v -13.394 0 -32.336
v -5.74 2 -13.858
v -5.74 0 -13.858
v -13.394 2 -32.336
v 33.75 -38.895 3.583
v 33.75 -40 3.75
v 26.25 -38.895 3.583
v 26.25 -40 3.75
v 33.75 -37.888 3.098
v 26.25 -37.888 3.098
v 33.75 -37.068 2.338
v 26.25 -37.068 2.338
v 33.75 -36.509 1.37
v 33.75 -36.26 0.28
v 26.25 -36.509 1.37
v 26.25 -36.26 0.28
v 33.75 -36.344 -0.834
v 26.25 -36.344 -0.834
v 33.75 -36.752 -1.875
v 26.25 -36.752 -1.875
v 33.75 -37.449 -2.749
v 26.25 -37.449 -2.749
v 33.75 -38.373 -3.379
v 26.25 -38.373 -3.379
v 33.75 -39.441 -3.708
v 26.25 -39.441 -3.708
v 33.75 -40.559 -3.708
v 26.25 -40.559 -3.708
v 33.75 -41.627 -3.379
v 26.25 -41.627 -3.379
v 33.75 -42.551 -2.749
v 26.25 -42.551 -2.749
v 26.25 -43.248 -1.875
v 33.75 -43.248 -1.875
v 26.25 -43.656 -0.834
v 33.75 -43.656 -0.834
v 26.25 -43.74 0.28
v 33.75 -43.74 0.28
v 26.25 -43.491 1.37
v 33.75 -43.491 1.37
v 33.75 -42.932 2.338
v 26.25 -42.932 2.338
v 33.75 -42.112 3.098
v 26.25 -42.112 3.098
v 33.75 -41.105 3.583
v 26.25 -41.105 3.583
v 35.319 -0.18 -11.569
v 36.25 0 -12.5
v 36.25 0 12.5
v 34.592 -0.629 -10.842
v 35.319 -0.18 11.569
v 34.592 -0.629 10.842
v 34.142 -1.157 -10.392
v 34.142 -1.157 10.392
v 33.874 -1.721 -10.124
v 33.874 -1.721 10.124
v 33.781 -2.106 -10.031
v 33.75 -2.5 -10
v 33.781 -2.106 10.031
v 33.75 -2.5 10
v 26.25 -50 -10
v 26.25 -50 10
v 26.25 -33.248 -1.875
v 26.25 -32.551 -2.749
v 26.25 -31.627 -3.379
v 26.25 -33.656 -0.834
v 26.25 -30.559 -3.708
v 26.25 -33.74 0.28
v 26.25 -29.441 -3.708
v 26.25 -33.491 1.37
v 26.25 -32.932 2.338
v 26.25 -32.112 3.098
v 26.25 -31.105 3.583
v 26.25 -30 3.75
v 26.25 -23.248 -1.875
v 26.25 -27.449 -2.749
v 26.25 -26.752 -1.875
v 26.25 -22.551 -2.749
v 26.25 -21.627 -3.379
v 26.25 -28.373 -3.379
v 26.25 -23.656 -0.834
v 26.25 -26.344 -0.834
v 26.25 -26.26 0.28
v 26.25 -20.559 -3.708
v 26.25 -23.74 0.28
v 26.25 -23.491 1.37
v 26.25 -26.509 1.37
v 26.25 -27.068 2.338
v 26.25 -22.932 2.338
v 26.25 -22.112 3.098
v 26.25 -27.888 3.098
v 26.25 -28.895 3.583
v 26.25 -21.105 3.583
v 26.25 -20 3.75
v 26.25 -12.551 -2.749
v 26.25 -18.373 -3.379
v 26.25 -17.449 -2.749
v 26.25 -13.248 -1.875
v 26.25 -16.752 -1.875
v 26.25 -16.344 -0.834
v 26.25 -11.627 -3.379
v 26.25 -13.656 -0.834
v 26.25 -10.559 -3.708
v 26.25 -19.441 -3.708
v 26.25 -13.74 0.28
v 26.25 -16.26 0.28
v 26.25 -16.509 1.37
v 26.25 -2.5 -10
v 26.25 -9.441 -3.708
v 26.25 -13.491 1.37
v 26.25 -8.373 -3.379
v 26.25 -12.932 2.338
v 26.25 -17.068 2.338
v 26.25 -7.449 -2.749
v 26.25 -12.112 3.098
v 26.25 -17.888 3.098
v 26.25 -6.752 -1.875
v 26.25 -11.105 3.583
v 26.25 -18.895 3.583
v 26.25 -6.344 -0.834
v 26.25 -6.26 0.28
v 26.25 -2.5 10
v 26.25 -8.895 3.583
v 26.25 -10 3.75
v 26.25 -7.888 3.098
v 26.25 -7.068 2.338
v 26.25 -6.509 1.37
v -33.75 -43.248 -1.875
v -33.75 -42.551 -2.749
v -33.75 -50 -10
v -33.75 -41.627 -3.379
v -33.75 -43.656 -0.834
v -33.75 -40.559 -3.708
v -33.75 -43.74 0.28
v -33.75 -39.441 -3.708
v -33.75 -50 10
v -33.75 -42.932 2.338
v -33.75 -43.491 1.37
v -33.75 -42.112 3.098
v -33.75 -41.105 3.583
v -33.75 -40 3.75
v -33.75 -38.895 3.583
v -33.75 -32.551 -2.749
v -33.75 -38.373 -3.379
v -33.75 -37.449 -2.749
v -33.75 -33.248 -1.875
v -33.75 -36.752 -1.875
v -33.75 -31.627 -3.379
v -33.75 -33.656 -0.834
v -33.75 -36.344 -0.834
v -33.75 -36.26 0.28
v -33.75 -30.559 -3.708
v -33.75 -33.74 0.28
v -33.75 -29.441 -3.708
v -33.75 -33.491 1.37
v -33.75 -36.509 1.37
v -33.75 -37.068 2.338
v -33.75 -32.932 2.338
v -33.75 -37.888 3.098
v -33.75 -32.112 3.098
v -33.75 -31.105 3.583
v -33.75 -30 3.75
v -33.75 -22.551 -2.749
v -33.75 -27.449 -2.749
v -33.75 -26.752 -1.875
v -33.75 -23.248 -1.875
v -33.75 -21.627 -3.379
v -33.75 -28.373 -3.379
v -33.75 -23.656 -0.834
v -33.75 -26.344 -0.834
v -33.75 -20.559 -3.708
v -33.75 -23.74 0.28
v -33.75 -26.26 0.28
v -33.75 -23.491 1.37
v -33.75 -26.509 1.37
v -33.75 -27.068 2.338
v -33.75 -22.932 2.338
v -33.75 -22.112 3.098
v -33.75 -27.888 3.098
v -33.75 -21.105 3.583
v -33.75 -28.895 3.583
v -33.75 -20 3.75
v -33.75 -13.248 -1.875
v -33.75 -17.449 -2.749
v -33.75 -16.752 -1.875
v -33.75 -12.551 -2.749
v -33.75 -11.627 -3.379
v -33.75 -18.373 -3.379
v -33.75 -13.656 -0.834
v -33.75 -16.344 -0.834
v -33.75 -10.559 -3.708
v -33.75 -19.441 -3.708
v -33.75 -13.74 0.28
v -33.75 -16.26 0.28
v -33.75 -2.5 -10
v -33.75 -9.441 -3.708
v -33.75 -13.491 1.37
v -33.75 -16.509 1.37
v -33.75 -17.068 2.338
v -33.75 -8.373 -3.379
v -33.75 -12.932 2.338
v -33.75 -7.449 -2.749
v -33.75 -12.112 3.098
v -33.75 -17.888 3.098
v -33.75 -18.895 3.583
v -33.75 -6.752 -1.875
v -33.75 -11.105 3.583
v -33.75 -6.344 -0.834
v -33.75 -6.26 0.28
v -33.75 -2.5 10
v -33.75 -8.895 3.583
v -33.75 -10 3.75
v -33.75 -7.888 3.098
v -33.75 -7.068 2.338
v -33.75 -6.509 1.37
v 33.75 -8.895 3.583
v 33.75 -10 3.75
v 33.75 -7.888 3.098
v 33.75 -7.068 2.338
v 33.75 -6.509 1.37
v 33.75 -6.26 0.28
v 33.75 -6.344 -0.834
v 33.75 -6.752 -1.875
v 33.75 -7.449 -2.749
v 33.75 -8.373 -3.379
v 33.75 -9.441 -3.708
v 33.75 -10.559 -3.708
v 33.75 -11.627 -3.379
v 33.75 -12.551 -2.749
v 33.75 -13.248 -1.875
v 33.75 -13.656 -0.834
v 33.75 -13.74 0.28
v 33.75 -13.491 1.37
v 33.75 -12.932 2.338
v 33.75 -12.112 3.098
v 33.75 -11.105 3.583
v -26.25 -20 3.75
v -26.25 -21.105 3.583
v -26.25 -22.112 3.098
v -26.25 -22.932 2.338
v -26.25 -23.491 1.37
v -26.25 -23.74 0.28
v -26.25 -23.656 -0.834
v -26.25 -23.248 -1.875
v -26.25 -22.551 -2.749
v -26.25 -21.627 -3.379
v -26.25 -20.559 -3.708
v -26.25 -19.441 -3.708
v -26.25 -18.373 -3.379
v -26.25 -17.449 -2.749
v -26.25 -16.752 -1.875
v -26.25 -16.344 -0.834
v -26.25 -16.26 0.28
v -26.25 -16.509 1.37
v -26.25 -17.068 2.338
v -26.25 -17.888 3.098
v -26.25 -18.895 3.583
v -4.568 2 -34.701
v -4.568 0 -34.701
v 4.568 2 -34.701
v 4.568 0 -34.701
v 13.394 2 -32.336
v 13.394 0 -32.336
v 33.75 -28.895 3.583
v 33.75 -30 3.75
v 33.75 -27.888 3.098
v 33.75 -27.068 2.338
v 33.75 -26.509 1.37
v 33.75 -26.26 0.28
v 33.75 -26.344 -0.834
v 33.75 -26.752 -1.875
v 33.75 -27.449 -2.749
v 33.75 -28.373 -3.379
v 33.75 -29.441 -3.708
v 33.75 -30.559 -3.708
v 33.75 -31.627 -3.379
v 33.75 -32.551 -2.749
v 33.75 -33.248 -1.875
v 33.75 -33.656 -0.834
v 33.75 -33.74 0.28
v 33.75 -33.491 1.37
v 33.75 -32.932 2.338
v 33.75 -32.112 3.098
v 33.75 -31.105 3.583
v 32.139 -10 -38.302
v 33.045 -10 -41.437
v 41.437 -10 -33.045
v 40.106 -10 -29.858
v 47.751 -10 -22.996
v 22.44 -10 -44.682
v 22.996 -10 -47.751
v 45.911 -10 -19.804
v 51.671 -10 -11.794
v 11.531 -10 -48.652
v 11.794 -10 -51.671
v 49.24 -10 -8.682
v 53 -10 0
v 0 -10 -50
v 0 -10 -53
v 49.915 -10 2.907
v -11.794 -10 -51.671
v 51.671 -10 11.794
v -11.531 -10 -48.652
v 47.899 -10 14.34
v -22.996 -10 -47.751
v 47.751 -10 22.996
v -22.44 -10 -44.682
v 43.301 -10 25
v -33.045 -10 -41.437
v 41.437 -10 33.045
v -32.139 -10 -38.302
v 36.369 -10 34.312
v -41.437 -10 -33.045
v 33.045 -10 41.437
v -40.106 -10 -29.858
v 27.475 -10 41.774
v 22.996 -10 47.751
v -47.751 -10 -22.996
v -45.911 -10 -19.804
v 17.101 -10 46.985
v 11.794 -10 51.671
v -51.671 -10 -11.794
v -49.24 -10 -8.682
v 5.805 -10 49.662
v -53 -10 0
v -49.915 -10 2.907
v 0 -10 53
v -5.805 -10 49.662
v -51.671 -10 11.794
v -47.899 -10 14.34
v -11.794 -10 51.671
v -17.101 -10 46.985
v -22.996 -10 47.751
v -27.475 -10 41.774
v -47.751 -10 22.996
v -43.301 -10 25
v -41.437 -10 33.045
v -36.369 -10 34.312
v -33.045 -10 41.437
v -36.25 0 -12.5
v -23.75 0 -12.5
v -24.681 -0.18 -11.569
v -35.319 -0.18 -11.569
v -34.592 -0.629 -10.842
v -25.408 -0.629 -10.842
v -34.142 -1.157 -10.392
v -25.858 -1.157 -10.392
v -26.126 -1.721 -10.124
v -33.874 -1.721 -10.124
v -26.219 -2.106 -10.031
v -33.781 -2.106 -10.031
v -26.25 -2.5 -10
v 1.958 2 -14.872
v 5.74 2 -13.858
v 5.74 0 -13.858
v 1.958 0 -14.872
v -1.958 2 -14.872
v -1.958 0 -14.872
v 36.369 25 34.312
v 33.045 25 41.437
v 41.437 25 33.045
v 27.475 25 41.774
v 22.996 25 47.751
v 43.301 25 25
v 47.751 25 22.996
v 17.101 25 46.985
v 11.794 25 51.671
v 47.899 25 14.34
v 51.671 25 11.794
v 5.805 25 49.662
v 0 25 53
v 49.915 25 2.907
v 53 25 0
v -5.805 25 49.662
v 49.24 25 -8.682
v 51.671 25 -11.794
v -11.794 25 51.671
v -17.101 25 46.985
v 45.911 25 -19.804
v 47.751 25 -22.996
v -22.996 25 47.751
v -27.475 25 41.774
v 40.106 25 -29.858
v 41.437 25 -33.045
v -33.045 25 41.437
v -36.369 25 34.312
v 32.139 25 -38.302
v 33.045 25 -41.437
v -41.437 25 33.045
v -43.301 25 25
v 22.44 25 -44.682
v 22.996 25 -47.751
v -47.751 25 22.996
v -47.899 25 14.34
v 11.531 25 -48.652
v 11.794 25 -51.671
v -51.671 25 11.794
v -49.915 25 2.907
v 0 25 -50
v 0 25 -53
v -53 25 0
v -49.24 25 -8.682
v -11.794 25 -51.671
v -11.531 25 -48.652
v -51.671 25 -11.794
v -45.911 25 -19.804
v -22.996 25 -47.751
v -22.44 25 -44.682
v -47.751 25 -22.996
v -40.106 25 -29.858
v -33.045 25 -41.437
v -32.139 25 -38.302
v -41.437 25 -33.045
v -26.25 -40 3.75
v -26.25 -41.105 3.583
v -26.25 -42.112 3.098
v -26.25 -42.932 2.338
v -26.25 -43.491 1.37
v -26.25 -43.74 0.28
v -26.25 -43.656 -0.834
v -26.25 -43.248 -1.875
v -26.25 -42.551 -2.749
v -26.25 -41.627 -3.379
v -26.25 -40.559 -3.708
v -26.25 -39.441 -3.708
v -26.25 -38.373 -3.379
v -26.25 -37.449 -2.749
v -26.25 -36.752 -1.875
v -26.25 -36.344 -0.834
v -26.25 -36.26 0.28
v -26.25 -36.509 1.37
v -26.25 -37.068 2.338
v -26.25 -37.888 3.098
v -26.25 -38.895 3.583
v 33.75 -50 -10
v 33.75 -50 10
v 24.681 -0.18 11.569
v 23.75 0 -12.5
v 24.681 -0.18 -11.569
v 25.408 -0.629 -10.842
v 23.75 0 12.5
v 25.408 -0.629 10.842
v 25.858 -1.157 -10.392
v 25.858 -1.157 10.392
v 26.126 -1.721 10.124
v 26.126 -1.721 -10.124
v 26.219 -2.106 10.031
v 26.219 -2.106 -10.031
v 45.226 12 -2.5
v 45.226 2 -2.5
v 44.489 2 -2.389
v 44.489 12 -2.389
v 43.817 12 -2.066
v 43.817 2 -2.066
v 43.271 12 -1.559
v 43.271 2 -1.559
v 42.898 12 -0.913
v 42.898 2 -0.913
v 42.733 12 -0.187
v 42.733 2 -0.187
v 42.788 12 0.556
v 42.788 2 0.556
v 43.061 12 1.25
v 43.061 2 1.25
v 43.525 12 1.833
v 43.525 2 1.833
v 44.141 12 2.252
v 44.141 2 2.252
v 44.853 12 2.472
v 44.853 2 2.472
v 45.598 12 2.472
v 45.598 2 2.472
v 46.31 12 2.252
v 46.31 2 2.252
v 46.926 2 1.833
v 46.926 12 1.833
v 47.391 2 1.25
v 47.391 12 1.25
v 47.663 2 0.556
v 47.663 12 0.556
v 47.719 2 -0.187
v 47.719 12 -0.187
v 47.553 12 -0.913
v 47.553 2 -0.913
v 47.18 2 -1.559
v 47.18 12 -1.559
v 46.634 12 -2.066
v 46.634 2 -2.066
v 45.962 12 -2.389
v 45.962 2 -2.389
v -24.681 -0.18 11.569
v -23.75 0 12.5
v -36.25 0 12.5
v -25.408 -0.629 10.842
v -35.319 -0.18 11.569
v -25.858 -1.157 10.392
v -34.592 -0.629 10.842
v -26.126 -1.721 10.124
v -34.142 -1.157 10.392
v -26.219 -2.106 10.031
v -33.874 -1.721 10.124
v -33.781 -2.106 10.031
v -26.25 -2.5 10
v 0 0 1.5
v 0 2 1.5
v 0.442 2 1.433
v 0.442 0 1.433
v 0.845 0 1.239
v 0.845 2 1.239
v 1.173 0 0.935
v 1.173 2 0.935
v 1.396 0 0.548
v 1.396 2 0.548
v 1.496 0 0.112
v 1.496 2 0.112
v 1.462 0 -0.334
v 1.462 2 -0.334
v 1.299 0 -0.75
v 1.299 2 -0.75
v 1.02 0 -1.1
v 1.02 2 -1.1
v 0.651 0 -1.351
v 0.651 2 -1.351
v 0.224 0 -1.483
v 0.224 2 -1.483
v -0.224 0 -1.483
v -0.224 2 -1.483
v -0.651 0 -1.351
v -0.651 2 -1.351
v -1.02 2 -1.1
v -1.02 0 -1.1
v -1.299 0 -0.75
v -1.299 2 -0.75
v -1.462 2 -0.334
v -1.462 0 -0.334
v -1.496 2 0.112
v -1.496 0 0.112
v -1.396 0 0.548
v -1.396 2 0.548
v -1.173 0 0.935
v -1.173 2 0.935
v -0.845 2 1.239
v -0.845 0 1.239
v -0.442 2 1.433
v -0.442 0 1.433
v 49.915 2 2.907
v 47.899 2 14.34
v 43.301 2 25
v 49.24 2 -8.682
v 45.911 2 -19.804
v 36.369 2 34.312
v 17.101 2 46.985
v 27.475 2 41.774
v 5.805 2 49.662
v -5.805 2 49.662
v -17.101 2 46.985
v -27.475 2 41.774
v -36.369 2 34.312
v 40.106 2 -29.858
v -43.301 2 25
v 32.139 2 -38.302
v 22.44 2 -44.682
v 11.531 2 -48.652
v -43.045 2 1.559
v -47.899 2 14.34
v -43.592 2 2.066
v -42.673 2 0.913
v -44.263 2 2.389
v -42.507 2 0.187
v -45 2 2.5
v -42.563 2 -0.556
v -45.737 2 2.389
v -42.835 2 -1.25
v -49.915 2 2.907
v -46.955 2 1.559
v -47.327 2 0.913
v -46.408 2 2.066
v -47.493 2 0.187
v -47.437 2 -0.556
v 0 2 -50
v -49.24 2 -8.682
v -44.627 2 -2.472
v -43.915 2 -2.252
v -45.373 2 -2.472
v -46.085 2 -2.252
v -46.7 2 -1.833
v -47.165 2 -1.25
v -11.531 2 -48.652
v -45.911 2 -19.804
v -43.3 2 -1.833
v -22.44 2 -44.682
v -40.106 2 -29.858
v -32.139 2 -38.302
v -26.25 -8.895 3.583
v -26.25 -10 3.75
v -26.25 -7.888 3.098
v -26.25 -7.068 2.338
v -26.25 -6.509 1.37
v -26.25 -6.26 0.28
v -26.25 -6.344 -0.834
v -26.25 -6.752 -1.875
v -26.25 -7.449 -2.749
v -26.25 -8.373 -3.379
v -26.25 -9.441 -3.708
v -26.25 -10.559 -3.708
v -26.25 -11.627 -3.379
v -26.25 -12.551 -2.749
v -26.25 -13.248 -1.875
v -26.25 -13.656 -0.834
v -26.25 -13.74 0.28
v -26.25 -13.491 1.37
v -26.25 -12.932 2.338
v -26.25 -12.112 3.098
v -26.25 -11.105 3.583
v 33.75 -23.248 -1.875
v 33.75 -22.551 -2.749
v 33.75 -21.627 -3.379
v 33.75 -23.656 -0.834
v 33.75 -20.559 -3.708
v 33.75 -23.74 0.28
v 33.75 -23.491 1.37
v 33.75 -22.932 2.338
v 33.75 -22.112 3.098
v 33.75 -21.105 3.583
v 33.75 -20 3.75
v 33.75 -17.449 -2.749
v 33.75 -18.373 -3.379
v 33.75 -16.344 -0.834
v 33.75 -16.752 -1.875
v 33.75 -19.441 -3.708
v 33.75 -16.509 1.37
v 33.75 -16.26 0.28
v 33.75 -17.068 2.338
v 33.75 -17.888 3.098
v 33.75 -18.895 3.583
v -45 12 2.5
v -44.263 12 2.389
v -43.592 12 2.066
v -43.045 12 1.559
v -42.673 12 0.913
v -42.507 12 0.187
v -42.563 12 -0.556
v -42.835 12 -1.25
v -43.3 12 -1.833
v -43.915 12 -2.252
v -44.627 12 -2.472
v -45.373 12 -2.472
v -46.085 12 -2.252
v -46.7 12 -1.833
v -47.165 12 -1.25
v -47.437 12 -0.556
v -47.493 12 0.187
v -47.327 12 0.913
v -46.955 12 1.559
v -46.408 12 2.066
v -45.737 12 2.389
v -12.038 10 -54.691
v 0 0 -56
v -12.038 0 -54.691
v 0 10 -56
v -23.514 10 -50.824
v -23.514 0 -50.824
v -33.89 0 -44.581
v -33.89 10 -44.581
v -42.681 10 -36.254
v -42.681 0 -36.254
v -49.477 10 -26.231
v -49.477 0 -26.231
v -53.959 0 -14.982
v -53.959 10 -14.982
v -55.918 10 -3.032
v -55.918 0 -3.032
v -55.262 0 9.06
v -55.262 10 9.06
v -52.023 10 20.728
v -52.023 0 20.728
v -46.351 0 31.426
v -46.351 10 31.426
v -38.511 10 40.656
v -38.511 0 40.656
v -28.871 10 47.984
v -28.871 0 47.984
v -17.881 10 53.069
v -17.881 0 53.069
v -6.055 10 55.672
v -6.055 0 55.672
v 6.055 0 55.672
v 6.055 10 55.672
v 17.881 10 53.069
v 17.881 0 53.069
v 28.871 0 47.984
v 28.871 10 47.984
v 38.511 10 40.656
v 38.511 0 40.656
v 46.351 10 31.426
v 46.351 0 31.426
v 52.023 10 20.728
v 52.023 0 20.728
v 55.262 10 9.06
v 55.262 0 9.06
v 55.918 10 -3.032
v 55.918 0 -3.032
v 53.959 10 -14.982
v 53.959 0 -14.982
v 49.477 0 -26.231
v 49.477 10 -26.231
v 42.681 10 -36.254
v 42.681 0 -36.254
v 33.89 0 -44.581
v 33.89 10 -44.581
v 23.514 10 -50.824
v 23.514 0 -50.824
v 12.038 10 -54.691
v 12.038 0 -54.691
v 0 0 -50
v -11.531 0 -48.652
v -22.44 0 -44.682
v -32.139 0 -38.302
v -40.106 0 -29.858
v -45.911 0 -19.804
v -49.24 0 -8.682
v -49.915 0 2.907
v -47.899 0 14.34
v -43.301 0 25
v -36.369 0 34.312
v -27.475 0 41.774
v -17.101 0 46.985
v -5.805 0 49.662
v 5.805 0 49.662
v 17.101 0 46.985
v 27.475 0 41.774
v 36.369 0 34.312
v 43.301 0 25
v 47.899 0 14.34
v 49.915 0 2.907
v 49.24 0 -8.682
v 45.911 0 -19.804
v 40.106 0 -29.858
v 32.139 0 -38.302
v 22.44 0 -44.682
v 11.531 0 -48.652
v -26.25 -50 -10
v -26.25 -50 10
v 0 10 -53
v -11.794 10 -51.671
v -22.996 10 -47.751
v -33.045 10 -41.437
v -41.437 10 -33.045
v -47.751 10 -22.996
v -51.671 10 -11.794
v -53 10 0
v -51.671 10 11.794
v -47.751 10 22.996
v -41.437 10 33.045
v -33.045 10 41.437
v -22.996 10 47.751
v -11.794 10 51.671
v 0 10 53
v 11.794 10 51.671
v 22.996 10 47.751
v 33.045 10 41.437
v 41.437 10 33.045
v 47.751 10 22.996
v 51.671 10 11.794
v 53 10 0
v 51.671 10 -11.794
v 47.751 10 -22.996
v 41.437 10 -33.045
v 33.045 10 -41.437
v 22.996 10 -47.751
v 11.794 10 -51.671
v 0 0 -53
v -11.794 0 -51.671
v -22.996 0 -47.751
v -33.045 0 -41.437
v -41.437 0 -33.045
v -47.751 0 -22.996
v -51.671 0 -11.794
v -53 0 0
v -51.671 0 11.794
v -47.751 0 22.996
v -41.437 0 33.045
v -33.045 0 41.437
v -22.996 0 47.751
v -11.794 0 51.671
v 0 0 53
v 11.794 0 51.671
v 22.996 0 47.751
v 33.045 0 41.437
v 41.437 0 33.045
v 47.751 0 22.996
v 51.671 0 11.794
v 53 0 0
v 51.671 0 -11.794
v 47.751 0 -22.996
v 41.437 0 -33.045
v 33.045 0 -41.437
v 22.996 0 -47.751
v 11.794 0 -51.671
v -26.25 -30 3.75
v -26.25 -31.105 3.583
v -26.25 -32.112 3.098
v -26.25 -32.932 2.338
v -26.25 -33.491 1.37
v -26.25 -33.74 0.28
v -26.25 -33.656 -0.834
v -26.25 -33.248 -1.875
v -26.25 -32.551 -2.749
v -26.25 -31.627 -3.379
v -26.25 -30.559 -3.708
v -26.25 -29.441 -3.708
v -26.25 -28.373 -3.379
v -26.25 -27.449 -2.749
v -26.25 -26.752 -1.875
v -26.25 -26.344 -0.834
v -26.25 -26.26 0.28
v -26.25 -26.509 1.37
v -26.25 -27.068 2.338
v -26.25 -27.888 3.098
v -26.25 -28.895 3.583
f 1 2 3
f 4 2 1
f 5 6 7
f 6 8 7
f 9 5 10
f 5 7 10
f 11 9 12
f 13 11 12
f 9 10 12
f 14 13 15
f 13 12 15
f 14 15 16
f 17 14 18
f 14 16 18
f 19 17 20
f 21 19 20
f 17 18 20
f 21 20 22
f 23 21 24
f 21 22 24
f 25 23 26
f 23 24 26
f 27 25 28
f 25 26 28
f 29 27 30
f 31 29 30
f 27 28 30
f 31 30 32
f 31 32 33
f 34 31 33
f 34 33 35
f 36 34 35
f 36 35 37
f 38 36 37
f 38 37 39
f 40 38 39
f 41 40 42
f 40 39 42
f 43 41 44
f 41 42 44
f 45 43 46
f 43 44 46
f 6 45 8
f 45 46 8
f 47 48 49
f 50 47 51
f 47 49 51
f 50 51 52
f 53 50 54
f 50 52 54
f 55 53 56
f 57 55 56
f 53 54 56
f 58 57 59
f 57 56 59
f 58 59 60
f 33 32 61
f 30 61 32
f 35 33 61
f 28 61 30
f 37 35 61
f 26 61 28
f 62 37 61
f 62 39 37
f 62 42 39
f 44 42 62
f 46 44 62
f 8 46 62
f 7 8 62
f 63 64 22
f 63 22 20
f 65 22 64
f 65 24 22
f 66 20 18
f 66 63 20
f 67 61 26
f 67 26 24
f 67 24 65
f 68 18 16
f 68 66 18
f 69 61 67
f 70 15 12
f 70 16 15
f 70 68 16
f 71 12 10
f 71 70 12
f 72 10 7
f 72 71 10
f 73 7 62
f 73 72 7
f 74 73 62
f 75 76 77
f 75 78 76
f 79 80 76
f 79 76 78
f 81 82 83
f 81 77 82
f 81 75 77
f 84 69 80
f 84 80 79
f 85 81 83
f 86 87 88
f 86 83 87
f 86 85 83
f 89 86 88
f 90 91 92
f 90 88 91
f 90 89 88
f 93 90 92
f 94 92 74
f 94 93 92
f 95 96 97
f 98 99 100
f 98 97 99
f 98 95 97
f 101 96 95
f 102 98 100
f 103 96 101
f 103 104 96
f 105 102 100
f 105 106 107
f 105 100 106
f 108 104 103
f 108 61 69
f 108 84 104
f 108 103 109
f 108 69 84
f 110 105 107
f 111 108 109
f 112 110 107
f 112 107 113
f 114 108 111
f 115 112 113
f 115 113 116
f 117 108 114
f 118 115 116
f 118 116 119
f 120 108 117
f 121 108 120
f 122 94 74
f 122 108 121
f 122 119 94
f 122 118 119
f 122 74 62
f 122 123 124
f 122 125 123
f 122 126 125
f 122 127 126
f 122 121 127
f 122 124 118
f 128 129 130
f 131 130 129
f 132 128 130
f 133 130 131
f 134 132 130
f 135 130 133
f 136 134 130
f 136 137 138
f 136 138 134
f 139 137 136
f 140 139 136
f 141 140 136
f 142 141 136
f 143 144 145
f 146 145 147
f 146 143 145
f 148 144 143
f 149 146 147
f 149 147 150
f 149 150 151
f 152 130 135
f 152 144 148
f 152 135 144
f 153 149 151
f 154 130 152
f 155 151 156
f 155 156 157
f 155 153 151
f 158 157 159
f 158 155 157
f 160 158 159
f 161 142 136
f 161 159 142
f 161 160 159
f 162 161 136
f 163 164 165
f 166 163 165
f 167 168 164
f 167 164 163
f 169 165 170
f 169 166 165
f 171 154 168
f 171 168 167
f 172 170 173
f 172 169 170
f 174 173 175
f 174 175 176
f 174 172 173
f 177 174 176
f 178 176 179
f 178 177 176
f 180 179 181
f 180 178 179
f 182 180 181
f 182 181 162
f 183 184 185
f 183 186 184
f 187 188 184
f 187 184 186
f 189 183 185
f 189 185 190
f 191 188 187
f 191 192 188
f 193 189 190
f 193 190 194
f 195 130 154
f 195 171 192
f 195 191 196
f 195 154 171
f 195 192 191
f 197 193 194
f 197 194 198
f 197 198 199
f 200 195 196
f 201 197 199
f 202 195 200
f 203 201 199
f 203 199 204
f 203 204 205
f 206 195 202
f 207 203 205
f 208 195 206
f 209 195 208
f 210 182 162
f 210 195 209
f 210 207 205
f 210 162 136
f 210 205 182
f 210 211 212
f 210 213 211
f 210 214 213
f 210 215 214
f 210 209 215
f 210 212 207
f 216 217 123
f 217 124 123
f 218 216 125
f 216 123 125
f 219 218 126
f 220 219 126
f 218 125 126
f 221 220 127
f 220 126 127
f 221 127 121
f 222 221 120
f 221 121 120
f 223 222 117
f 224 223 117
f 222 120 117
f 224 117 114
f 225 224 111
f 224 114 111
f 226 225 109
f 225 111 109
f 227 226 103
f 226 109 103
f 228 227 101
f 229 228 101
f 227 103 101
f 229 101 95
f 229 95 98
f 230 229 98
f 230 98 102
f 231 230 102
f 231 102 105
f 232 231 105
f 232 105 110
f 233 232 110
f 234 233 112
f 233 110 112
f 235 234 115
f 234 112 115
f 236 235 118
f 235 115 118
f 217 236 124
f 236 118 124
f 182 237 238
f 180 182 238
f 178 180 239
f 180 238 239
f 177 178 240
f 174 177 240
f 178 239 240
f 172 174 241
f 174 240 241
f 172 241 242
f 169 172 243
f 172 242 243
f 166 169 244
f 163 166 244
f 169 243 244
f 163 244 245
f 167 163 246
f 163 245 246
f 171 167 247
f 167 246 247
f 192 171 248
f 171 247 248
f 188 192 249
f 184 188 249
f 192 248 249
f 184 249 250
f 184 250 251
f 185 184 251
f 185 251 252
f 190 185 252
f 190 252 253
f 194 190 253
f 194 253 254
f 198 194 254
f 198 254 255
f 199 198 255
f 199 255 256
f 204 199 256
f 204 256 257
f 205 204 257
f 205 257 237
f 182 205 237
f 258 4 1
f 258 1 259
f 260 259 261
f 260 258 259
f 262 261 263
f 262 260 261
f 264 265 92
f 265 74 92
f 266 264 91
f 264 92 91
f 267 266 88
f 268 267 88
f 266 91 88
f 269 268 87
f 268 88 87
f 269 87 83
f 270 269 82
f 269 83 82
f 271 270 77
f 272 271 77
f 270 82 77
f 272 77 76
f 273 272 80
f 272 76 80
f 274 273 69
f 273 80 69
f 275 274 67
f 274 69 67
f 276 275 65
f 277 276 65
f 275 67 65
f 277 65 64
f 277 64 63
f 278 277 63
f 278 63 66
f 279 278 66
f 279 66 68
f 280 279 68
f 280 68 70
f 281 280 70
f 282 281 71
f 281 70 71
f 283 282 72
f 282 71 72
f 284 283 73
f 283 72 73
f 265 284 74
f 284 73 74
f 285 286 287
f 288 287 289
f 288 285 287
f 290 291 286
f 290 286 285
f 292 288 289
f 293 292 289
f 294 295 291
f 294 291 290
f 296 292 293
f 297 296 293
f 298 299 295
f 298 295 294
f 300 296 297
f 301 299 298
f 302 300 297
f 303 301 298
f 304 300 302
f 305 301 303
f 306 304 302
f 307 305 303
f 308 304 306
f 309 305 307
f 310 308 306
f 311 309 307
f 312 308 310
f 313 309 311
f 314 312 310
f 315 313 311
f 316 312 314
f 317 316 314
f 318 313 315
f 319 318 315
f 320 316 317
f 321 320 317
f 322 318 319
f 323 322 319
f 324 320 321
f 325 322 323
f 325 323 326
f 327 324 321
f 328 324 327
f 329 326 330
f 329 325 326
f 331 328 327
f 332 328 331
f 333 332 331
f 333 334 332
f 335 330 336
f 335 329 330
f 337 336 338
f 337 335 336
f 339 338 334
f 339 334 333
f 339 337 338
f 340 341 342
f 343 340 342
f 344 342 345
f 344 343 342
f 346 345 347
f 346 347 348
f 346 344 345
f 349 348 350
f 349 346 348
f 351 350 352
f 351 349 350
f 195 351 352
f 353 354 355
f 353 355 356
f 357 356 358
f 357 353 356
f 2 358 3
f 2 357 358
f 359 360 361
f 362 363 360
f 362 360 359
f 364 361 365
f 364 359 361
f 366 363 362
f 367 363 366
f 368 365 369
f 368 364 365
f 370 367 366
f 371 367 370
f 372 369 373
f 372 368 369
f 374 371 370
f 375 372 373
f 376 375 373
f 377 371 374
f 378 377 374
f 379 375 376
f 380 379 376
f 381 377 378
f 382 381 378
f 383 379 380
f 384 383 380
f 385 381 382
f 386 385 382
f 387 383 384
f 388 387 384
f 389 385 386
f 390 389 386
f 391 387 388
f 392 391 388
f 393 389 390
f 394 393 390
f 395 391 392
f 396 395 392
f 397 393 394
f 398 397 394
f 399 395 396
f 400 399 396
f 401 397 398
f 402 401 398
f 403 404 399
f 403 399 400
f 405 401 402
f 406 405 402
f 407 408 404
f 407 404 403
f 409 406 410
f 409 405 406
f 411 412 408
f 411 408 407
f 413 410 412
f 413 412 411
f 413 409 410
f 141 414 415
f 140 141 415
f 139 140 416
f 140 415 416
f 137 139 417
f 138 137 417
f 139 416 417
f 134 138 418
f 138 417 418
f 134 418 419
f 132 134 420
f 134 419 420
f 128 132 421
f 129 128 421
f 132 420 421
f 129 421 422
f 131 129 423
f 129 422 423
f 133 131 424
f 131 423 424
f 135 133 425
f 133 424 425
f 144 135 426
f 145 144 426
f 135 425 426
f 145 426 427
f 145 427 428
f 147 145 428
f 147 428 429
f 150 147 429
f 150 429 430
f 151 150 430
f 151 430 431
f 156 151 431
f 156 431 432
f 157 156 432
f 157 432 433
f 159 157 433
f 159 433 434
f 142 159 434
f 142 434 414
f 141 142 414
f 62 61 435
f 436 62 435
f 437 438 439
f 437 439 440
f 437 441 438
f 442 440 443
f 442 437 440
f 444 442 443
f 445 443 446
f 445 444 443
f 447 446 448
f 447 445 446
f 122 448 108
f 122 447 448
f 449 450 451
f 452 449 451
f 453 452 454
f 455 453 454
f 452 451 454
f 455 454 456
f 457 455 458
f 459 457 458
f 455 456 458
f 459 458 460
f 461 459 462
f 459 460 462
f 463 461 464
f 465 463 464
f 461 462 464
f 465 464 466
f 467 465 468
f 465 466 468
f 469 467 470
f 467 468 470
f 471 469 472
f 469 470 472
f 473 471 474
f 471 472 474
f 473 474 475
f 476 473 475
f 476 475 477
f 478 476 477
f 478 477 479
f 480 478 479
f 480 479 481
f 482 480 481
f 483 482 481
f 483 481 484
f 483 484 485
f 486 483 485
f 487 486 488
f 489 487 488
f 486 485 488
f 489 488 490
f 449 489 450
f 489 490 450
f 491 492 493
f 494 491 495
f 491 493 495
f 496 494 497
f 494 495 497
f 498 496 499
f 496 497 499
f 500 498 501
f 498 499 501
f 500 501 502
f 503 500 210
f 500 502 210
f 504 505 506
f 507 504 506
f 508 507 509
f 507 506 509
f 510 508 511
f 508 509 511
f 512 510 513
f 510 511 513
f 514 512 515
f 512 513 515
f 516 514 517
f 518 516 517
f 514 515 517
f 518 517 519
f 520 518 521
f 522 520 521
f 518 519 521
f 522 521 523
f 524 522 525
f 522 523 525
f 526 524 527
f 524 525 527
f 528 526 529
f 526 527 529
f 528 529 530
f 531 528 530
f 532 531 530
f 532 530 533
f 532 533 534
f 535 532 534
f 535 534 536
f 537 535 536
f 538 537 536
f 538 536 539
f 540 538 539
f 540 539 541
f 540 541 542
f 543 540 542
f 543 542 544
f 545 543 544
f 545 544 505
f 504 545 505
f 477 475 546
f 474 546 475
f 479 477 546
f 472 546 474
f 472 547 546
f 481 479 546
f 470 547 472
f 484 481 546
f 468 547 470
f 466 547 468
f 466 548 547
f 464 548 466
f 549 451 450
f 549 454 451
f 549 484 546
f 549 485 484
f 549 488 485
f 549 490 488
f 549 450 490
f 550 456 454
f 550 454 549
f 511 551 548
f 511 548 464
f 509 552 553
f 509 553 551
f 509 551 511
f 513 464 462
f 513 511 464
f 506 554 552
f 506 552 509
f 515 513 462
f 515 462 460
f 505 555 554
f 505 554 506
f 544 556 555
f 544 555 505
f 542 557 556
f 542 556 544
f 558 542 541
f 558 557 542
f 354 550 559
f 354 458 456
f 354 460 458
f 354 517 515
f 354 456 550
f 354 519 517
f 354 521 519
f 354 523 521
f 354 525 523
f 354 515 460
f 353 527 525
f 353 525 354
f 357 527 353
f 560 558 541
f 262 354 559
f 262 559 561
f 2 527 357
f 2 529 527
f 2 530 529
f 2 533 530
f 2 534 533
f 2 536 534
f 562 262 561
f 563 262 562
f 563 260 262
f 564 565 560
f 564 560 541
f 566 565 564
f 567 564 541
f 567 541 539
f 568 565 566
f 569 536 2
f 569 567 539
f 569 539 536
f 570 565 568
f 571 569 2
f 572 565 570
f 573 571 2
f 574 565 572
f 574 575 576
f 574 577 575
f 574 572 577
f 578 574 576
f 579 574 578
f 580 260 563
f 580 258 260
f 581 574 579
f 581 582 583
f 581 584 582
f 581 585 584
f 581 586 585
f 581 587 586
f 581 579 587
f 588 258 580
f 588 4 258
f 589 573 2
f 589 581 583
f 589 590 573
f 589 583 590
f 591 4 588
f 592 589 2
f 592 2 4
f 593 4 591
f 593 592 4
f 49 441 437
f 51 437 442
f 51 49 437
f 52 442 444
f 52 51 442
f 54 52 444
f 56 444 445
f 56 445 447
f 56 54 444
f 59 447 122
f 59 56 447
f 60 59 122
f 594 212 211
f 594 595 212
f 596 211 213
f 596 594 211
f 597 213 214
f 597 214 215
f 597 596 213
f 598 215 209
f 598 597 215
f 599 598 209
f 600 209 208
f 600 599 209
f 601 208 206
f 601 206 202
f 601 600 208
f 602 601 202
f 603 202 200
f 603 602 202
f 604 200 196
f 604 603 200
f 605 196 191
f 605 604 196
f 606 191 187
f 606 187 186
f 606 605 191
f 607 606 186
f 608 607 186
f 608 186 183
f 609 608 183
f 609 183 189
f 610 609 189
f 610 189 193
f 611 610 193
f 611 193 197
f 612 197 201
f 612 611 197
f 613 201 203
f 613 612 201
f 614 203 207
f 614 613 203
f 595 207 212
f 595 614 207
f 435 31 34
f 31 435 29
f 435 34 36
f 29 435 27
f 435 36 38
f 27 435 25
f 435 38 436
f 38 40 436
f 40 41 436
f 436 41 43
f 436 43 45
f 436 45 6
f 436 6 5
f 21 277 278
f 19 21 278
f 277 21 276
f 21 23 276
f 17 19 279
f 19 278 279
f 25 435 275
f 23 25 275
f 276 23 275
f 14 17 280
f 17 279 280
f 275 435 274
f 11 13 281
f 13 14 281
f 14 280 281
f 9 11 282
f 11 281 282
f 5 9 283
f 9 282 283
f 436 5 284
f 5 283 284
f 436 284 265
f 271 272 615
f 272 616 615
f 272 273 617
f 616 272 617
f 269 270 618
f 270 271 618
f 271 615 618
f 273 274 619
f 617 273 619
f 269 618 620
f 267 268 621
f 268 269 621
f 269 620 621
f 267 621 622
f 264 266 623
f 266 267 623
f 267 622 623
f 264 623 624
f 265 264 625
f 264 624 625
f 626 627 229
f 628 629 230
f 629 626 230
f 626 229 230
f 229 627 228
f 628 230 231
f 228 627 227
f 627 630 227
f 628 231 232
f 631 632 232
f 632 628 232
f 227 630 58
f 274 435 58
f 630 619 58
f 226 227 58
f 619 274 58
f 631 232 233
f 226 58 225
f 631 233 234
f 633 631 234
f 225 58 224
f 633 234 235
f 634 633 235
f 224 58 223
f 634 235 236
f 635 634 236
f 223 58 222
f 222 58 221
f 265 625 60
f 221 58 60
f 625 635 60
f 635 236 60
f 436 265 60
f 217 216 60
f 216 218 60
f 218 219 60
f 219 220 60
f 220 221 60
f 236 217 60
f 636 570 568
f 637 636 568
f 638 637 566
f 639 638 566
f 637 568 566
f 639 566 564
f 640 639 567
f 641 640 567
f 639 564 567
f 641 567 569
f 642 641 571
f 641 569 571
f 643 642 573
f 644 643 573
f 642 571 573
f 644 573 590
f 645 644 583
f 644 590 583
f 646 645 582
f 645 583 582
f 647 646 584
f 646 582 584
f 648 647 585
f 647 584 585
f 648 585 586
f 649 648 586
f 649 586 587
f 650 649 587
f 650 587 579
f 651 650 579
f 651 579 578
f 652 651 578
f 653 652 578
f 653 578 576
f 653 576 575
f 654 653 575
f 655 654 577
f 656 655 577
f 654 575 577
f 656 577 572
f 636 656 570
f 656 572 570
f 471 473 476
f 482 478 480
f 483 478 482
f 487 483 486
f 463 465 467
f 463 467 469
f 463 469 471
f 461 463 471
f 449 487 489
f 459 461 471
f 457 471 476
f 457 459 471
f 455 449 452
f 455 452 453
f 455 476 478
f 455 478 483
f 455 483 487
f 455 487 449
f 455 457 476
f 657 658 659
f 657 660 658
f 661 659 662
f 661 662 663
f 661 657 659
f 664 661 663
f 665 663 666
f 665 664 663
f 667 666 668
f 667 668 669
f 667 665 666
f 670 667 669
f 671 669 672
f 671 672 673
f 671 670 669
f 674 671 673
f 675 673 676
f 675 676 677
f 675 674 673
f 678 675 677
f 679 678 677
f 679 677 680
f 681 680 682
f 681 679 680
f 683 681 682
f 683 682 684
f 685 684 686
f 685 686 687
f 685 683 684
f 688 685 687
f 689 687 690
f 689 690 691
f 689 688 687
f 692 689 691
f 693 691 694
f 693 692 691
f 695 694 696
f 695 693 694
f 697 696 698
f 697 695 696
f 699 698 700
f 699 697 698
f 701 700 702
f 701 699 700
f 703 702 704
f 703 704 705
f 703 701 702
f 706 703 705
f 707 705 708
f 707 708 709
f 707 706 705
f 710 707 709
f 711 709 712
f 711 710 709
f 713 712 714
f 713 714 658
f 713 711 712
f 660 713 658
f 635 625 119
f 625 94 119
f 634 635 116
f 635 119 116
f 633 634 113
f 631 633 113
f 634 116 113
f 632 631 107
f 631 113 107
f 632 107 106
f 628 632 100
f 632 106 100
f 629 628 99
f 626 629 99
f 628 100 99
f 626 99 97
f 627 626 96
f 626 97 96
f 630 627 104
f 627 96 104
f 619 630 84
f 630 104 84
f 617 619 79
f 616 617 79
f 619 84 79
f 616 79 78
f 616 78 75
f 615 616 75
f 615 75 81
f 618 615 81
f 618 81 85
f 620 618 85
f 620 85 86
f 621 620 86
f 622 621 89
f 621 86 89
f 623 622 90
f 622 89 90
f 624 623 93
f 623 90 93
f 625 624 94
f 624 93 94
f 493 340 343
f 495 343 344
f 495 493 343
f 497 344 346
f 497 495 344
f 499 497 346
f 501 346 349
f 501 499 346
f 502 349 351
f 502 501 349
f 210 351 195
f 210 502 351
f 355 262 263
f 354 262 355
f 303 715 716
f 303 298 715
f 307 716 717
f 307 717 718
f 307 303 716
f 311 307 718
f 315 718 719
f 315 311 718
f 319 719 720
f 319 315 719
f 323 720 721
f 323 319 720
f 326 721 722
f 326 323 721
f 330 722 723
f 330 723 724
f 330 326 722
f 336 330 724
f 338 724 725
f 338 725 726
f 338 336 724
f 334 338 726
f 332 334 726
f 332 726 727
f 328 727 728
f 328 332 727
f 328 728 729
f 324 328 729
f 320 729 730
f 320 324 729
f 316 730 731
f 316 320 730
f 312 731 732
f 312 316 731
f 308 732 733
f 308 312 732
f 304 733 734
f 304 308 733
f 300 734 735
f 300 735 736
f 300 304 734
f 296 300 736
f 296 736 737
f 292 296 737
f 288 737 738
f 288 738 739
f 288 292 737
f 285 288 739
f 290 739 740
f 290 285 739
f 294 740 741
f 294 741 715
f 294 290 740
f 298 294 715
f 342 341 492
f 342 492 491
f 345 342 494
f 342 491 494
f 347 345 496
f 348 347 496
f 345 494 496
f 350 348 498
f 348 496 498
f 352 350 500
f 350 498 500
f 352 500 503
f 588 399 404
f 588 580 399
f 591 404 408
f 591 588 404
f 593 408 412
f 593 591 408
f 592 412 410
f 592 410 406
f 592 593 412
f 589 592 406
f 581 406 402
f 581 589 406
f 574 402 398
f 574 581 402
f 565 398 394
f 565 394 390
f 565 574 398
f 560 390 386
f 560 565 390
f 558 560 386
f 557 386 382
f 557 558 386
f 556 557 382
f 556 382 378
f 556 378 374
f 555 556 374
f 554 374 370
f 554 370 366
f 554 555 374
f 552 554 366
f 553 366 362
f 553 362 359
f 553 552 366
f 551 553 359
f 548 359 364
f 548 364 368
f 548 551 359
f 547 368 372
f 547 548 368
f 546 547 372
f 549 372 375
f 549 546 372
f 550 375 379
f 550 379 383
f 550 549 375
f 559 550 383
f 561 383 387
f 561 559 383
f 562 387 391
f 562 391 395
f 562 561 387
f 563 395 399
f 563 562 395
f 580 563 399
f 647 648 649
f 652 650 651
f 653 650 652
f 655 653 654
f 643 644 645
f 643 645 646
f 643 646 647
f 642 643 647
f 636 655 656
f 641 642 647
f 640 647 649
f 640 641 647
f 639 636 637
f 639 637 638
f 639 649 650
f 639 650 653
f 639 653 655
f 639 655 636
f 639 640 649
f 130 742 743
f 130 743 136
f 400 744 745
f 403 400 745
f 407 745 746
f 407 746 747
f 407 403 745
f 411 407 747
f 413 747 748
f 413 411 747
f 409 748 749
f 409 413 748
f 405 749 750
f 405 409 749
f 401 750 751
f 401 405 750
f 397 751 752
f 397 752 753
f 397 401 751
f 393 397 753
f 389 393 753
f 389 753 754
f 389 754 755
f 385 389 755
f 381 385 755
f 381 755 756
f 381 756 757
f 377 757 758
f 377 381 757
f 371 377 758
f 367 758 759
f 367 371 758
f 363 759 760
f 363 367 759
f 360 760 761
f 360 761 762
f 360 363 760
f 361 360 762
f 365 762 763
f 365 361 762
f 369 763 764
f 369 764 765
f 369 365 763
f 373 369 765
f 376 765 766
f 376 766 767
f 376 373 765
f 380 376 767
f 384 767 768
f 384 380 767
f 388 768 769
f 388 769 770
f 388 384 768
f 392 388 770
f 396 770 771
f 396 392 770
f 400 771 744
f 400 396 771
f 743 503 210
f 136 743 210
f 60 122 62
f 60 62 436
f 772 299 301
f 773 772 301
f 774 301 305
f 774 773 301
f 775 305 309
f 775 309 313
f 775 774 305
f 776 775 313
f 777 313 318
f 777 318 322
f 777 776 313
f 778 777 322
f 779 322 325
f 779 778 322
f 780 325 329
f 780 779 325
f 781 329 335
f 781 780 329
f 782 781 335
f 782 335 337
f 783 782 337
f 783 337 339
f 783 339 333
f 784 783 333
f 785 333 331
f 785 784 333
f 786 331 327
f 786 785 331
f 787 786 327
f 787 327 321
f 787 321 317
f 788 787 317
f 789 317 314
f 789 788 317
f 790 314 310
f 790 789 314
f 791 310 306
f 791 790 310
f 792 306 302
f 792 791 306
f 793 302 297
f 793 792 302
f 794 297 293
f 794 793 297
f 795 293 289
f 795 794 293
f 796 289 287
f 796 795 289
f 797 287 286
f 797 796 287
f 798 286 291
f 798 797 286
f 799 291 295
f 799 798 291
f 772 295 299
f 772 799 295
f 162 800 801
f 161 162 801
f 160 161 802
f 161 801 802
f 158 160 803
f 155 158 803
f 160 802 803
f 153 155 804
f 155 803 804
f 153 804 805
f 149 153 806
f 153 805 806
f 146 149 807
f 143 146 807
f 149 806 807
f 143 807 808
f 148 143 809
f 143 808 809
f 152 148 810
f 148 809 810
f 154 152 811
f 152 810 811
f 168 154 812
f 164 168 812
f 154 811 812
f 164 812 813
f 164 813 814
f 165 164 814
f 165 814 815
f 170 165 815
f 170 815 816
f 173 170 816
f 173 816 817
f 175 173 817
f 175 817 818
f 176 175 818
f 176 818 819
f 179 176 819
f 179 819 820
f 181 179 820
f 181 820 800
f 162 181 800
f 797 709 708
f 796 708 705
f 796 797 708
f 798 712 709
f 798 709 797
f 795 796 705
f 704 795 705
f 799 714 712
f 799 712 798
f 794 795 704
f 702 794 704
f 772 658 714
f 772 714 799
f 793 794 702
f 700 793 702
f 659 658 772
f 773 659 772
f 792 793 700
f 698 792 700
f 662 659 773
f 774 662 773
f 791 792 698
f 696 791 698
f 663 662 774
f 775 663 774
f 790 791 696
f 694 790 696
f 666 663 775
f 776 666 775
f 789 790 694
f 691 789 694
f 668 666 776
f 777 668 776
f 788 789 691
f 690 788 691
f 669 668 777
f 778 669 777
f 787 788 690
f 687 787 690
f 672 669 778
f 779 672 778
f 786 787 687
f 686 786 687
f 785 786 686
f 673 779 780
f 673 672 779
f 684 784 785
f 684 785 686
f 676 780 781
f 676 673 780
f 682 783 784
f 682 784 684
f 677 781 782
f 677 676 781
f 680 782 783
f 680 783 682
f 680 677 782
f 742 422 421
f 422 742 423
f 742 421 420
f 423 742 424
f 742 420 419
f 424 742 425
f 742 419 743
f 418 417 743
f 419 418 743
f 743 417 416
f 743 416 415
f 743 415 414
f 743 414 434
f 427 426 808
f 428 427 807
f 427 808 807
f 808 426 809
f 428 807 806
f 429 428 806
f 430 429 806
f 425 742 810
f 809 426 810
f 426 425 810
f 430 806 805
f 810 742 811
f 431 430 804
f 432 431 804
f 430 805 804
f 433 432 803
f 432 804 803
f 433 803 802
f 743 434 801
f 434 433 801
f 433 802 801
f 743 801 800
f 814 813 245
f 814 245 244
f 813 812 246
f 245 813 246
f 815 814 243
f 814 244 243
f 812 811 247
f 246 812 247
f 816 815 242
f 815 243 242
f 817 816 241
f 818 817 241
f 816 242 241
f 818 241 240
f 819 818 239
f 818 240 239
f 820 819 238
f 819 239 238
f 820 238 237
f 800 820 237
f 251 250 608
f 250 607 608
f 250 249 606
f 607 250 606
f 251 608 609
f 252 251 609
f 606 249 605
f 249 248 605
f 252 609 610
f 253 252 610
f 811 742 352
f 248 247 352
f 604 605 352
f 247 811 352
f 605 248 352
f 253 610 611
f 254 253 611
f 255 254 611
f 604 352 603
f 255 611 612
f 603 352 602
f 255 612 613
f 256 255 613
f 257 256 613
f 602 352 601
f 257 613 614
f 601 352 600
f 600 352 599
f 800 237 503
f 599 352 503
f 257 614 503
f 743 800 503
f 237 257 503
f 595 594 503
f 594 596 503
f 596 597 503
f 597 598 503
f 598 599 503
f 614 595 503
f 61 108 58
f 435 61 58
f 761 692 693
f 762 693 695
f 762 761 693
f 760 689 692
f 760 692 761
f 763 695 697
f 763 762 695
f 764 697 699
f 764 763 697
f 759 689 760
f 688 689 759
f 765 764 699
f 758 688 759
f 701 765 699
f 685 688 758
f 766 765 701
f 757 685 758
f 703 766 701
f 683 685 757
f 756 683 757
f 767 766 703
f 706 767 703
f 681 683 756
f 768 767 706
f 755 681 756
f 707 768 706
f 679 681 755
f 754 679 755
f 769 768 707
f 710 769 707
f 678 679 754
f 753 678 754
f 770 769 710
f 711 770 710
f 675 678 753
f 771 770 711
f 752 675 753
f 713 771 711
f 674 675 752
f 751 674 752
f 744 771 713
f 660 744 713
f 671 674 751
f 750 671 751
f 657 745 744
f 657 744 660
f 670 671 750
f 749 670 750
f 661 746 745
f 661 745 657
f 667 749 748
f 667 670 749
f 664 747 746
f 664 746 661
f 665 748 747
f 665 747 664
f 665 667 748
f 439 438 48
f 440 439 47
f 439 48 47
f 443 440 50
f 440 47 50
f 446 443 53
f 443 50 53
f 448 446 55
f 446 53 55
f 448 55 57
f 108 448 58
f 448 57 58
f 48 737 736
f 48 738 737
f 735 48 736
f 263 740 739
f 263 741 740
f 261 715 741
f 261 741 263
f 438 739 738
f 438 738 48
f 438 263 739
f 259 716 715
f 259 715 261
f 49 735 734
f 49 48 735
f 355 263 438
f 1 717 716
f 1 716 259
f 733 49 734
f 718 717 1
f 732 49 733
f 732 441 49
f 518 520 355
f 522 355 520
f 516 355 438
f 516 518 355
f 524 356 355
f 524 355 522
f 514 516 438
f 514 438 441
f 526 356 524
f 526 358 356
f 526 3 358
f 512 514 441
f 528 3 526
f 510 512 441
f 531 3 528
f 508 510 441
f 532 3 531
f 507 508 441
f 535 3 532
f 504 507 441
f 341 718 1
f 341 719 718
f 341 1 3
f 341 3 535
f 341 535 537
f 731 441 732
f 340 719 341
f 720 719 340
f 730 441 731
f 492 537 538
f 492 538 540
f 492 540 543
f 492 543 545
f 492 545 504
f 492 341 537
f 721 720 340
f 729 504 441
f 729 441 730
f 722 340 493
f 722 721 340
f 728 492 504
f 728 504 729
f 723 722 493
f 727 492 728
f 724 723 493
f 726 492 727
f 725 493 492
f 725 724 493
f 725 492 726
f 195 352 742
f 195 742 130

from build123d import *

# Parameters (mm, degrees)
SKETCH5_R               = 2.5
BOSS_EXTRUDE2_DEPTH     = 10
CIRPATTERN2_COUNT       = 2
CUT_EXTRUDE4_REACH      = 84.468
SKETCH7_R               = 1.5
CUT_EXTRUDE5_DEPTH      = 83.46817568
SKETCH10_W              = 7.5
SKETCH10_H              = 20
BOSS_EXTRUDE3_DEPTH     = 50
CUT_EXTRUDE6_REACH      = 113.36
SKETCH11_R              = 3.75
LPATTERN1_COUNT         = 4
LPATTERN1_PITCH         = 10
MIRROR1_COPY_1_REACH    = 113.36
MIRROR1_COPY_1_SKETCH_R = 3.75
MIRROR1_COPY_2_REACH    = 113.36
MIRROR1_COPY_2_SKETCH_R = 3.75
MIRROR1_COPY_3_REACH    = 113.36
MIRROR1_COPY_3_SKETCH_R = 3.75
FILLET1_R               = 2.5


with BuildPart() as part:
    # Sketch4 → Revolve2 (revolve)
    with BuildSketch(Plane(origin=(0, 0, 0), x_dir=(0, 0, -1), z_dir=(1, 0, 0))):
        Polygon((0, 0), (50, 0), (50, -10), (53, -10), (53, 0), (56, 0), (56, 10), (53, 10), (53, 25), (50, 25), (50, 2), (0, 2), align=None)
    revolve(axis=Axis((0, 0, 0), (0, 1, 0)))

    # Sketch5 → Boss-Extrude2 (add)
    with BuildSketch(Plane(origin=(0, 2, 0), x_dir=(1, 0, 0), z_dir=(0, 1, 0))):
        with Locations(Location((-45, 0, 0), (0, 0, 270))):
            Circle(SKETCH5_R)
    boss_extrude2 = extrude(amount=BOSS_EXTRUDE2_DEPTH)

    # CirPattern2: Boss-Extrude2 ×2 about axis
    cirpattern2_axis = Axis((0.112781955, 0, 0), (0, 1, 0))
    for i in range(1, CIRPATTERN2_COUNT):
        add(boss_extrude2.rotate(cirpattern2_axis, i * 360 / CIRPATTERN2_COUNT))

    # Sketch6 → Cut-Extrude4 (cut, up to next)
    with BuildSketch(Plane(origin=(0, 2, 0), x_dir=(1, 0, 0), z_dir=(0, 1, 0)), mode=Mode.PRIVATE) as cut_extrude4_sk1:
        with BuildLine():
            Line((-5.740251485, 13.858192988), (-13.393920133, 32.335783638))
            ThreePointArc((-13.393920133, 32.335783638), (0, 35), (13.393920133, 32.335783638))
            Line((13.393920133, 32.335783638), (5.740251485, 13.858192988))
            ThreePointArc((5.740251485, 13.858192988), (0, 15), (-5.740251485, 13.858192988))
        make_face()
    cut_extrude4_tool1 = extrude(cut_extrude4_sk1.sketch, amount=-CUT_EXTRUDE4_REACH, mode=Mode.PRIVATE) & part.part
    add(cut_extrude4_tool1.solids().sort_by_distance((0, 2, -25.661711))[0], mode=Mode.SUBTRACT)

    # Sketch7 → Cut-Extrude5 (cut, through all)
    with BuildSketch(Plane(origin=(0, 2, 0), x_dir=(1, 0, 0), z_dir=(0, 1, 0))):
        with Locations(Location((0, 0, 0), (0, 0, 270))):
            Circle(SKETCH7_R)
    extrude(amount=-CUT_EXTRUDE5_DEPTH, mode=Mode.SUBTRACT)

    # Sketch10 → Boss-Extrude3 (add)
    with BuildSketch(Plane.XZ):
        with Locations((30, 0)):
            Rectangle(SKETCH10_W, SKETCH10_H)
    boss_extrude3 = extrude(amount=BOSS_EXTRUDE3_DEPTH)

    # Sketch11 → Cut-Extrude6 (cut, up to next)
    with BuildSketch(Plane.ZY.offset(-26.25), mode=Mode.PRIVATE) as cut_extrude6_sk1:
        with Locations((0, -10)):
            Circle(SKETCH11_R)
    cut_extrude6_tool1 = extrude(cut_extrude6_sk1.sketch, amount=-CUT_EXTRUDE6_REACH, mode=Mode.PRIVATE) & part.part
    cut_extrude6 = cut_extrude6_tool1.solids().sort_by_distance((26.25, -10, 0))[0]
    add(cut_extrude6, mode=Mode.SUBTRACT)

    # LPattern1: Cut-Extrude6 ×4
    with Locations(*[(0, -i * LPATTERN1_PITCH, 0) for i in range(1, LPATTERN1_COUNT)]):
        add(cut_extrude6, mode=Mode.SUBTRACT)

    # Mirror1: Boss-Extrude3, Cut-Extrude6 across plane
    add(boss_extrude3.mirror(Plane(origin=(0, 0, 0), x_dir=(0, 0, 1), z_dir=(1, 0, 0))))
    add(cut_extrude6.mirror(Plane(origin=(0, 0, 0), x_dir=(0, 0, 1), z_dir=(1, 0, 0))), mode=Mode.SUBTRACT)

    # Mirror1 copy 1 sketch → Mirror1 copy 1 (cut, up to next)
    with BuildSketch(Plane(origin=(-26.25, -10, 0), x_dir=(0, 0, 1), z_dir=(1, 0, 0)), mode=Mode.PRIVATE) as mirror1_copy_1_sk1:
        with Locations((0, 10)):
            Circle(MIRROR1_COPY_1_SKETCH_R)
    mirror1_copy_1_tool1 = extrude(mirror1_copy_1_sk1.sketch, amount=-MIRROR1_COPY_1_REACH, mode=Mode.PRIVATE) & part.part
    add(mirror1_copy_1_tool1.solids().sort_by_distance((-26.25, -20, 0))[0], mode=Mode.SUBTRACT)

    # Mirror1 copy 2 sketch → Mirror1 copy 2 (cut, up to next)
    with BuildSketch(Plane(origin=(-26.25, -20, 0), x_dir=(0, 0, 1), z_dir=(1, 0, 0)), mode=Mode.PRIVATE) as mirror1_copy_2_sk1:
        with Locations((0, 10)):
            Circle(MIRROR1_COPY_2_SKETCH_R)
    mirror1_copy_2_tool1 = extrude(mirror1_copy_2_sk1.sketch, amount=-MIRROR1_COPY_2_REACH, mode=Mode.PRIVATE) & part.part
    add(mirror1_copy_2_tool1.solids().sort_by_distance((-26.25, -30, 0))[0], mode=Mode.SUBTRACT)

    # Mirror1 copy 3 sketch → Mirror1 copy 3 (cut, up to next)
    with BuildSketch(Plane(origin=(-26.25, -30, 0), x_dir=(0, 0, 1), z_dir=(1, 0, 0)), mode=Mode.PRIVATE) as mirror1_copy_3_sk1:
        with Locations((0, 10)):
            Circle(MIRROR1_COPY_3_SKETCH_R)
    mirror1_copy_3_tool1 = extrude(mirror1_copy_3_sk1.sketch, amount=-MIRROR1_COPY_3_REACH, mode=Mode.PRIVATE) & part.part
    add(mirror1_copy_3_tool1.solids().sort_by_distance((-26.25, -40, 0))[0], mode=Mode.SUBTRACT)

    # Fillet1
    fillet1_edges = [part.edges().sort_by_distance(p)[0] for p in [
        (30, 0, -10),
        (26.25, 0, 0),
        (30, 0, 10),
        (33.75, 0, 0),
        (-30, 0, 10),
        (-33.75, 0, 0),
        (-30, 0, -10),
        (-26.25, 0, 0),
    ]]
    fillet(fillet1_edges, radius=FILLET1_R)


solid = part.part
